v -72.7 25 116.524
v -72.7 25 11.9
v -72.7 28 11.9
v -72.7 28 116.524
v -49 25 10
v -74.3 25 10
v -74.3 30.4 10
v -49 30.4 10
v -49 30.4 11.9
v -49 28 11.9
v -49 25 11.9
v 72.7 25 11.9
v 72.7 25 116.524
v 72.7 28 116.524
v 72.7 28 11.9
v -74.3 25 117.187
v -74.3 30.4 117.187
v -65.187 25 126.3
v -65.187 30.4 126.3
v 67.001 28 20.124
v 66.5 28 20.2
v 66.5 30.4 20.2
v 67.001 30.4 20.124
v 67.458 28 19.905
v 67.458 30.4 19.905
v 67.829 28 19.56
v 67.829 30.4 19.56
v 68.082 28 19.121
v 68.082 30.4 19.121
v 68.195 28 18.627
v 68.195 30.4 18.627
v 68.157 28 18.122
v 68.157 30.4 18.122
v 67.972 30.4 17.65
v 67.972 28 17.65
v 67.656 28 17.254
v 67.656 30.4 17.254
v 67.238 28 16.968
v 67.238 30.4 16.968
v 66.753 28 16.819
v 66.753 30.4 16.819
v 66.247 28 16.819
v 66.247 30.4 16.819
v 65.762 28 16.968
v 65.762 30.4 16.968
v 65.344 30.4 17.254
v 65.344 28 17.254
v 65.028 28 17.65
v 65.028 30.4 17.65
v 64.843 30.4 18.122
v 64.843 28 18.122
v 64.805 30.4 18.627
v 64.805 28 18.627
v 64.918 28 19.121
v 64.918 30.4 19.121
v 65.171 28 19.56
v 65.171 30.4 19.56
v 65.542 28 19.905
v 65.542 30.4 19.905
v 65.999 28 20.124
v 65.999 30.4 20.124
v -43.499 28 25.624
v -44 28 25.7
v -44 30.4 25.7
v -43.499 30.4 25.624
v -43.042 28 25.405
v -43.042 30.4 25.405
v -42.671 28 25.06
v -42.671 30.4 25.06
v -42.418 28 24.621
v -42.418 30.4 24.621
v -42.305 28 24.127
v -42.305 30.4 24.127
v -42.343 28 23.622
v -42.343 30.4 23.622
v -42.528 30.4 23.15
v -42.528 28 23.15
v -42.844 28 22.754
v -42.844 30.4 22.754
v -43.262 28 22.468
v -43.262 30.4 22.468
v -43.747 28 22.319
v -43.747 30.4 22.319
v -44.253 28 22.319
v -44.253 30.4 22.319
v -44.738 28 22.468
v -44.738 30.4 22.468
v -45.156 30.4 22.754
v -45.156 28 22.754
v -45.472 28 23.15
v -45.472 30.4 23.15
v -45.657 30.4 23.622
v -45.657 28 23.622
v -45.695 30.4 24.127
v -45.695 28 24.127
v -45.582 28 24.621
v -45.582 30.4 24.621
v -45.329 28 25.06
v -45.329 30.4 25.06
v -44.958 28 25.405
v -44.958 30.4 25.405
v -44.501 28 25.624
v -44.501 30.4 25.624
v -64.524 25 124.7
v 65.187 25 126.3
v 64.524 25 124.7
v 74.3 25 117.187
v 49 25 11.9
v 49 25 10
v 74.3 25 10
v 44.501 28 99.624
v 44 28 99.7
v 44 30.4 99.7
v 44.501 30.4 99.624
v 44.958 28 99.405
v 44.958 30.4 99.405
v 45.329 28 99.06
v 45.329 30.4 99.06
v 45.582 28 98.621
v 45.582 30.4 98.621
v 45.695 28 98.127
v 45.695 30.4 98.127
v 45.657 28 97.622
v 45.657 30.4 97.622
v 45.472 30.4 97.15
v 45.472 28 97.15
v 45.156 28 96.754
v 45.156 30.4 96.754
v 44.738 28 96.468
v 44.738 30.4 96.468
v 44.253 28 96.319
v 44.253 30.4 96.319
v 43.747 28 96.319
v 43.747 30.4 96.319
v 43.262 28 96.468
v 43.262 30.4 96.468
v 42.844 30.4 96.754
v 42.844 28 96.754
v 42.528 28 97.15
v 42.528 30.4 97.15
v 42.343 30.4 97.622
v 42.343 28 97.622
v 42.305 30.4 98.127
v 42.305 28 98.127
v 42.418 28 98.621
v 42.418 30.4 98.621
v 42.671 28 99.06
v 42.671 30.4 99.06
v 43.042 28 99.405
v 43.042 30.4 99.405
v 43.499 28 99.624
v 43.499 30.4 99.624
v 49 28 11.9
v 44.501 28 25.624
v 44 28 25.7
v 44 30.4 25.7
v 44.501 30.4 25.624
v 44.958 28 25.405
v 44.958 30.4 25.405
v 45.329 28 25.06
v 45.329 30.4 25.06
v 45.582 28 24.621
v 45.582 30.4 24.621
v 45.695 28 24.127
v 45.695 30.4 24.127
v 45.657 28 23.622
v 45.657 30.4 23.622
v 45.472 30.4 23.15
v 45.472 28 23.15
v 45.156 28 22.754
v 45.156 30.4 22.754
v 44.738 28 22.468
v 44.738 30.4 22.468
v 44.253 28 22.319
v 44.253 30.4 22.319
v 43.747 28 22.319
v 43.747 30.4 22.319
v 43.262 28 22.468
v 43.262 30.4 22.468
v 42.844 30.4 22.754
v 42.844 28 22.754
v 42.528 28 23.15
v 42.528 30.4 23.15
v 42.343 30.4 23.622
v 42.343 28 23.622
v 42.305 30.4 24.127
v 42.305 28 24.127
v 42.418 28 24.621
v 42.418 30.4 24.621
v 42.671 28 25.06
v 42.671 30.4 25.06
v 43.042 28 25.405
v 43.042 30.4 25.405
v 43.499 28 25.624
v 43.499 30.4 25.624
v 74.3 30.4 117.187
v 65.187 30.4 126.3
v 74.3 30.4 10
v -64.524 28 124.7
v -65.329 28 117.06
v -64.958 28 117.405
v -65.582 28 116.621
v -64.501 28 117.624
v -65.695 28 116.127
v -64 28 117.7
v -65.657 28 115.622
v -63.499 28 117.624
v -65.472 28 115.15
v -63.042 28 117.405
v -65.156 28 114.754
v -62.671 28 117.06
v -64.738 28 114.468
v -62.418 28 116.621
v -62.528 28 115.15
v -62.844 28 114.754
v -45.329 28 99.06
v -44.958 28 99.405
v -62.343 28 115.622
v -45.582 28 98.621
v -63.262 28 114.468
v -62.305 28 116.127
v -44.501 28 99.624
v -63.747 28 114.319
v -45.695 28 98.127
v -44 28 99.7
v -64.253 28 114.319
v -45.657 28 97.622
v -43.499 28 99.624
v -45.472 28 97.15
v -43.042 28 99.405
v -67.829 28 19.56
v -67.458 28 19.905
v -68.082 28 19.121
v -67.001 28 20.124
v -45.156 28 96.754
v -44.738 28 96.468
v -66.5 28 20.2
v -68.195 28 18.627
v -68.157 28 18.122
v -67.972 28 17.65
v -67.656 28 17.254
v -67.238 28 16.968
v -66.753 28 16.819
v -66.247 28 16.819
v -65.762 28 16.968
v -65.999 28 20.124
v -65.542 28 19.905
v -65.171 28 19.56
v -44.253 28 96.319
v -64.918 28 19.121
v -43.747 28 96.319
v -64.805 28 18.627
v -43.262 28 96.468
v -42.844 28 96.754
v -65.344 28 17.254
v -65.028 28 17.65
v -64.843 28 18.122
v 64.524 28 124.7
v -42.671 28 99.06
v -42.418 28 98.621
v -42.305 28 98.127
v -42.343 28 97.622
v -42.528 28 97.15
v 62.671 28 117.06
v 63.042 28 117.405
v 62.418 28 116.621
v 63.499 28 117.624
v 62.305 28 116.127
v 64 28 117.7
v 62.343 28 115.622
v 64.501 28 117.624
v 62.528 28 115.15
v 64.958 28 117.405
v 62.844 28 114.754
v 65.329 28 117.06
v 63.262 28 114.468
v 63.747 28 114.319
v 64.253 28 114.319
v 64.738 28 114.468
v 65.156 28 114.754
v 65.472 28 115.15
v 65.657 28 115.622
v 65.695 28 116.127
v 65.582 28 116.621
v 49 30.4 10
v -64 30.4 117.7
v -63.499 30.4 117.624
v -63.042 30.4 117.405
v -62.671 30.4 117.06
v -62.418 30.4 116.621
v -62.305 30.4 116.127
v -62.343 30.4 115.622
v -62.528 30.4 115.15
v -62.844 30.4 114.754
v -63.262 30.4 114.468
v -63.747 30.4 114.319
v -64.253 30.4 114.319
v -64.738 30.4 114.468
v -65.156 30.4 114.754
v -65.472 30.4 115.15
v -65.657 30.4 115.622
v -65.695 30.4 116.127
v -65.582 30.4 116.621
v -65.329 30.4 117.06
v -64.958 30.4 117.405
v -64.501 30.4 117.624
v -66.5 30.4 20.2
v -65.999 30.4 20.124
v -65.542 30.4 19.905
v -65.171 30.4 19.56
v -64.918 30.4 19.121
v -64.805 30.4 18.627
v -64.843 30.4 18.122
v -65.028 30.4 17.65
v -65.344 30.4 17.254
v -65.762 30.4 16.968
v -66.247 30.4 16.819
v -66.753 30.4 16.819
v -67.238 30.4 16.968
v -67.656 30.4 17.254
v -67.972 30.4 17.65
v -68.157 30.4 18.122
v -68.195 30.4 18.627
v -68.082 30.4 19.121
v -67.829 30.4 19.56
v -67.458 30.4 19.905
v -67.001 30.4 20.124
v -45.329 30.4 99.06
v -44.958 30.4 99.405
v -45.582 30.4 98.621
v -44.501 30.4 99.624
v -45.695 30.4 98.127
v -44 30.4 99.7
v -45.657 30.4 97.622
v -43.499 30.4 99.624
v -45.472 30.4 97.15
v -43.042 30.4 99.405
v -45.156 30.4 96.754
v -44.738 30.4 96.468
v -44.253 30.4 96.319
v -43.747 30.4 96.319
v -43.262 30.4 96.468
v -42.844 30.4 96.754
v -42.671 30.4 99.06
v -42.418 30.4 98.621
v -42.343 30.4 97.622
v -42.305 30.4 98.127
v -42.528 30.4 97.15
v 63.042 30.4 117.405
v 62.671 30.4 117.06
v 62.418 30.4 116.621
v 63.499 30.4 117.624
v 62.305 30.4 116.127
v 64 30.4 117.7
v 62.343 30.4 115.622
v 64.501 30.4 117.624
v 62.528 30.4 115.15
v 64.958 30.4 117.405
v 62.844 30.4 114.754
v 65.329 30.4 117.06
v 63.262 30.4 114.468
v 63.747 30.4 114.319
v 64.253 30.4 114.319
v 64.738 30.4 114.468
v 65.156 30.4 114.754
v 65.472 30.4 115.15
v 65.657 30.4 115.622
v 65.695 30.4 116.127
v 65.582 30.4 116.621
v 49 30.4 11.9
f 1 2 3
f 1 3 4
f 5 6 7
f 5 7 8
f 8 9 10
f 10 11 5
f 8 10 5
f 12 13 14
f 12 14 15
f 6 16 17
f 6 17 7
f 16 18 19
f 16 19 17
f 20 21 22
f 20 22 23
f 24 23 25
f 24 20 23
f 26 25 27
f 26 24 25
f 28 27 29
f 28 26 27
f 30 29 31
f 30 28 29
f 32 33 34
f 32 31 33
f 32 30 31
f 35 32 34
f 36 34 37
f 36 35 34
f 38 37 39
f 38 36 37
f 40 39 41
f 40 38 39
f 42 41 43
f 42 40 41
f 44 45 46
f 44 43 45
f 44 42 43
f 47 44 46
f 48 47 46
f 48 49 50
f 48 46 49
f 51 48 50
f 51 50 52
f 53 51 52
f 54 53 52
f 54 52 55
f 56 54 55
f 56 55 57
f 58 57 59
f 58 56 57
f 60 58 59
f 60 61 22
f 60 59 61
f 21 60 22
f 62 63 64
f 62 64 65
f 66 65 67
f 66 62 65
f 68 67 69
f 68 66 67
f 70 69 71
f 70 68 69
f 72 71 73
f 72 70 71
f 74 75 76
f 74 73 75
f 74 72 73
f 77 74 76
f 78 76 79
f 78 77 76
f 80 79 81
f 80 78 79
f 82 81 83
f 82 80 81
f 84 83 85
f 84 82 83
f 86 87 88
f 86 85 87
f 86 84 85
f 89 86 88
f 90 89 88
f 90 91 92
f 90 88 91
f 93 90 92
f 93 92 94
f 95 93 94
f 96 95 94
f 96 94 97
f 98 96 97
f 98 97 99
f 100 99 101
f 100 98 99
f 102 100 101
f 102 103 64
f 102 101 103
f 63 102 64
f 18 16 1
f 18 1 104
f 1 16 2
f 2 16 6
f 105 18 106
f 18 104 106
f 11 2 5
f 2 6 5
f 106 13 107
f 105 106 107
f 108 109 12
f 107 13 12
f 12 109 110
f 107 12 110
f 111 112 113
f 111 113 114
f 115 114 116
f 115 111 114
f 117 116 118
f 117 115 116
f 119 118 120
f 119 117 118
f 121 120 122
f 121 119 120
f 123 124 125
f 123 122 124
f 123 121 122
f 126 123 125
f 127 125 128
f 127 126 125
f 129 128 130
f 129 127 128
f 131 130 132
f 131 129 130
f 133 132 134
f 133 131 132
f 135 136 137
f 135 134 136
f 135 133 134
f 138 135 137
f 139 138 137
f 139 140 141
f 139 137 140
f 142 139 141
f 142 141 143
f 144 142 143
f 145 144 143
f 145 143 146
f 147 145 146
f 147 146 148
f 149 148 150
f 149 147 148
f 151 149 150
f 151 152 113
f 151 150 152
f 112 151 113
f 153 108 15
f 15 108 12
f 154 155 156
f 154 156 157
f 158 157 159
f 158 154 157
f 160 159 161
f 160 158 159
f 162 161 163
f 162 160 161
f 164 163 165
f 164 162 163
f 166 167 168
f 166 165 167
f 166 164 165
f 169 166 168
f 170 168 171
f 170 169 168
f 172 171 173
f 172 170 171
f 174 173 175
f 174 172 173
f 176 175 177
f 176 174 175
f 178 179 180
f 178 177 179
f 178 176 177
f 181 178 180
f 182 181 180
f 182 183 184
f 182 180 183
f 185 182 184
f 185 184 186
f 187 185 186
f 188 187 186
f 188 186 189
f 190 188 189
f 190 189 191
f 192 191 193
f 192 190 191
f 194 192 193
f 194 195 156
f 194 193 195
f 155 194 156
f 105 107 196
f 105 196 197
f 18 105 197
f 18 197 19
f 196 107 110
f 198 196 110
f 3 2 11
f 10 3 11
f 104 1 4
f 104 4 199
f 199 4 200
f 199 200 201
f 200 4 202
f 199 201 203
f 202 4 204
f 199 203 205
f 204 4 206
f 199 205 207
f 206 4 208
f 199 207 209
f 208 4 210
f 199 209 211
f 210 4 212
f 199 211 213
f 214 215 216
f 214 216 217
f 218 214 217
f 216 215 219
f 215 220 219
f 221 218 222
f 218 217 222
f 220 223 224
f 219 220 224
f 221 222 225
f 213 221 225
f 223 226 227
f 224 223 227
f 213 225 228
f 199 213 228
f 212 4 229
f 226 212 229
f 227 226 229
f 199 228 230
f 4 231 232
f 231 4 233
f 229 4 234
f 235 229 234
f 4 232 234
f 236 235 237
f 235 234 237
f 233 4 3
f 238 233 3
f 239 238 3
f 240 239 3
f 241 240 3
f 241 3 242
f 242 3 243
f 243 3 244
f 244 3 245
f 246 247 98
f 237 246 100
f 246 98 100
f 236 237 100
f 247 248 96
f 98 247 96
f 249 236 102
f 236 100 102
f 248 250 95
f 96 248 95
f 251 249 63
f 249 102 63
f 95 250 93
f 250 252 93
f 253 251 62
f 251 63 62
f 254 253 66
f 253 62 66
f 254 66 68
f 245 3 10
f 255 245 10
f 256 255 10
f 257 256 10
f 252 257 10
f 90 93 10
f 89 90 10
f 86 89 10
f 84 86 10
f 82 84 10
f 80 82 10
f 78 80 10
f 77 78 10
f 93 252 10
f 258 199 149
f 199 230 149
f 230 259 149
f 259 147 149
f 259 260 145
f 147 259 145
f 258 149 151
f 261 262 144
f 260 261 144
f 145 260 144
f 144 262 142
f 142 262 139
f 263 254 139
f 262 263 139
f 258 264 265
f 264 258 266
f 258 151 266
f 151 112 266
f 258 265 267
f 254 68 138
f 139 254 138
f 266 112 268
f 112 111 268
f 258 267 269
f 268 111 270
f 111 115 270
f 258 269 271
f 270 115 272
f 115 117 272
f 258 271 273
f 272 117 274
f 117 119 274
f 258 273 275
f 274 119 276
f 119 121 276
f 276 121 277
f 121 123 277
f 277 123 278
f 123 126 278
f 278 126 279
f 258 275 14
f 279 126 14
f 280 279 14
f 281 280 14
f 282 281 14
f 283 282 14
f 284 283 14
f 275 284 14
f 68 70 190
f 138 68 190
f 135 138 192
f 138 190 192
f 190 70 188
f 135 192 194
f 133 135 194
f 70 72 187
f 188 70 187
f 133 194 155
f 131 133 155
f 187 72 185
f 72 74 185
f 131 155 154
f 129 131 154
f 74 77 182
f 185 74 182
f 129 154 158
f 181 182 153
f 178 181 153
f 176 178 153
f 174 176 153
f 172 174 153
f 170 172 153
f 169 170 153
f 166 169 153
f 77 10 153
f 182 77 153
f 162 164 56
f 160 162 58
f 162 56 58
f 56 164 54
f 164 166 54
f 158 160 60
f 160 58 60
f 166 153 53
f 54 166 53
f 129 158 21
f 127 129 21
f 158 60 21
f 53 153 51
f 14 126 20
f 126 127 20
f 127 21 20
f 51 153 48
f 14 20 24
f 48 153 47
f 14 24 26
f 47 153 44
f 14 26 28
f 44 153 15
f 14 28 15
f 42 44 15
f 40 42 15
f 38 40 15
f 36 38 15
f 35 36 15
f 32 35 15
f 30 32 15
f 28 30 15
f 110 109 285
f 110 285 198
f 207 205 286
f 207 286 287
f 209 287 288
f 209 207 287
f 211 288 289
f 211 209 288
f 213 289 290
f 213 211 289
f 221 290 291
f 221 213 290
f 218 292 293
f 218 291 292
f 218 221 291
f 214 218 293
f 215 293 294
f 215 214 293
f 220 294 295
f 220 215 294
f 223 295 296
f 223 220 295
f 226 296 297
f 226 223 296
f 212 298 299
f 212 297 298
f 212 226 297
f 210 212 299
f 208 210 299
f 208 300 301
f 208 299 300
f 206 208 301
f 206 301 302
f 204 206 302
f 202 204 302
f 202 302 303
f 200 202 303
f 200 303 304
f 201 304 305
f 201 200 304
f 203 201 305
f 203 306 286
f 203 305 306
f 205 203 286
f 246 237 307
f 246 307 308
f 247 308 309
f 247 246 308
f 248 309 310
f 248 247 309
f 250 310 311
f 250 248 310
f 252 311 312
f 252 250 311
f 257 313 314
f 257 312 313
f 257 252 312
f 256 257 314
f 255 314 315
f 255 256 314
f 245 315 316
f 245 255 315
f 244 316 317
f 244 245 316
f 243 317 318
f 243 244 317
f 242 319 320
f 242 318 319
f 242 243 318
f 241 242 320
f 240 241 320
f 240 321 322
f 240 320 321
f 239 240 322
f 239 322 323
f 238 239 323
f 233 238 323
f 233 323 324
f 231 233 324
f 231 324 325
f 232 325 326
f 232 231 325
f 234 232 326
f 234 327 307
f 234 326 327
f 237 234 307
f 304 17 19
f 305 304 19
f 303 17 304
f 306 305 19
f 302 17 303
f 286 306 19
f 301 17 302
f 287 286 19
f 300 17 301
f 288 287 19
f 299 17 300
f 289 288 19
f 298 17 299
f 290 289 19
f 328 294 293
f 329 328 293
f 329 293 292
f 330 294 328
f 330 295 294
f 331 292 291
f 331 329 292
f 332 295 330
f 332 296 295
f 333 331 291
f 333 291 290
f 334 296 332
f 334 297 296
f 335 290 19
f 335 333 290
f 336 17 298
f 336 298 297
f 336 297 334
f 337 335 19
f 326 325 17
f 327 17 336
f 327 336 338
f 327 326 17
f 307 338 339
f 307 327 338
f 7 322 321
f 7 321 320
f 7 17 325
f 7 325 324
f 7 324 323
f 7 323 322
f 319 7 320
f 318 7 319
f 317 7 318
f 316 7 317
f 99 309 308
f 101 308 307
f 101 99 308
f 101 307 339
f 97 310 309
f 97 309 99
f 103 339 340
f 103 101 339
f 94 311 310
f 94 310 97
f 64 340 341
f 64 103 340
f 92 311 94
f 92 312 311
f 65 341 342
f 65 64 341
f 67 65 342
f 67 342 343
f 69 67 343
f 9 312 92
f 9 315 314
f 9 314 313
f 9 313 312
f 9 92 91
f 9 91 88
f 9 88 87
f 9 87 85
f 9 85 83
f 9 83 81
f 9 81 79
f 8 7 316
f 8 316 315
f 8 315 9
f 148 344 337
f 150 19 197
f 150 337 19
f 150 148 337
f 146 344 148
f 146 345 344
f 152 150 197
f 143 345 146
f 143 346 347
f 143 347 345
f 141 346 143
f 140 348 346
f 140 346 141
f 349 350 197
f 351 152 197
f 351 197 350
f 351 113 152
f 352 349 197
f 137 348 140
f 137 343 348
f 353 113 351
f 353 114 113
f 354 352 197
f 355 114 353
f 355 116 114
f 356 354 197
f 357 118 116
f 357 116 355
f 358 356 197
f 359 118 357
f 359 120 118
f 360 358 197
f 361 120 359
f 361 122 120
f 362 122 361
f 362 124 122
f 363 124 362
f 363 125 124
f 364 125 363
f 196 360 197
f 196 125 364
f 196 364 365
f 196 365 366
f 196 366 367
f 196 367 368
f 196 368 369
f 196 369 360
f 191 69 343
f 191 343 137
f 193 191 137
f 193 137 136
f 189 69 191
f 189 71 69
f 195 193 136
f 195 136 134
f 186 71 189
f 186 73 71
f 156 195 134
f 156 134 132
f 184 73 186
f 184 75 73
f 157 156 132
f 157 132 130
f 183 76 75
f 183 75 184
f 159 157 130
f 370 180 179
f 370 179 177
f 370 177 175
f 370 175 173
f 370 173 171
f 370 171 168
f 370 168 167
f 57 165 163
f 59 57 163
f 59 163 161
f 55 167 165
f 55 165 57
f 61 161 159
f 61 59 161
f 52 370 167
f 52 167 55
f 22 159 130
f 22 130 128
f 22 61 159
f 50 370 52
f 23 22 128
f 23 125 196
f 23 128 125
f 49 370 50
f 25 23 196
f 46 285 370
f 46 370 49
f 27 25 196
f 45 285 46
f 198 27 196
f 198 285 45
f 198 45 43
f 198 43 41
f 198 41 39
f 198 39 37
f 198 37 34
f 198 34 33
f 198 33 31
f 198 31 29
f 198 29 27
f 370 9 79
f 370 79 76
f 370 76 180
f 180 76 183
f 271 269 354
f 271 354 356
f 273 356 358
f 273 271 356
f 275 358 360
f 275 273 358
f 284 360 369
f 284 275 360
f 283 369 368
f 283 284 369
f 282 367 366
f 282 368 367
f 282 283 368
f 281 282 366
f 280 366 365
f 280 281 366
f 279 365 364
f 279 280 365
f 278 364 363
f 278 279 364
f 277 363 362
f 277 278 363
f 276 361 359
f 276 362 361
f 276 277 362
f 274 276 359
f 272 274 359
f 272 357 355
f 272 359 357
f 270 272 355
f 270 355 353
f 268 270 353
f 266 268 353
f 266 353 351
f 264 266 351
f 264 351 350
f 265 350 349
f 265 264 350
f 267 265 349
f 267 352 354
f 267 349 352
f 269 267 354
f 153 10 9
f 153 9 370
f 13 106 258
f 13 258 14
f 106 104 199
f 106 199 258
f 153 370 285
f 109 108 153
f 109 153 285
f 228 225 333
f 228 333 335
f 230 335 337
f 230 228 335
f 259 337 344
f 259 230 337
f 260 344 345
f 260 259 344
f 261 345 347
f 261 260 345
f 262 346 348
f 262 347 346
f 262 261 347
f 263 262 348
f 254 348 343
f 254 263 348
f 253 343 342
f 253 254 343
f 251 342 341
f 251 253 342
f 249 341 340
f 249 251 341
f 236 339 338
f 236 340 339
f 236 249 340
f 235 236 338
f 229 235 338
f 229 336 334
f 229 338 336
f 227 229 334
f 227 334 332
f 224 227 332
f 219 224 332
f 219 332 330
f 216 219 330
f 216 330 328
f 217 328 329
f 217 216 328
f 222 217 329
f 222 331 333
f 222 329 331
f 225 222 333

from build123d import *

# Parameters (mm, degrees)
LID_PLATE_DEPTH     = 2.4
DRIP_SKIRT_DEPTH    = 3.01
SKETCH3_W           = 25.3
SKETCH3_H           = 1.9
FRONT_SKIRT_L_DEPTH = 5.4
SKETCH4_W           = 25.3
SKETCH4_H           = 1.9
FRONT_SKIRT_R_DEPTH = 5.4
SKETCH5_R           = 1.7
SCREW_HOLES_DEPTH   = 4.4


with BuildPart() as part:
    # Sketch1 → Lid Plate (new body)
    with BuildSketch(Plane(origin=(0, 28, 0), x_dir=(1, 0, 0), z_dir=(0, 1, 0))):
        Polygon((-65.187005769, -126.3), (65.187005769, -126.3), (74.3, -117.187005769), (74.3, -11.9), (-74.3, -11.9), (-74.3, -117.187005769), align=None)
    extrude(amount=LID_PLATE_DEPTH)

    # Sketch2 → Drip Skirt (add)
    with BuildSketch(Plane(origin=(0, 25, 0), x_dir=(1, 0, 0), z_dir=(0, 1, 0))):
        Polygon((74.3, -11.9), (74.3, -117.187005769), (65.187005769, -126.3), (-65.187005769, -126.3), (-74.3, -117.187005769), (-74.3, -11.9), (-72.7, -11.9), (-72.7, -116.524264069), (-64.524264069, -124.7), (64.524264069, -124.7), (72.7, -116.524264069), (72.7, -11.9), align=None)
    extrude(amount=DRIP_SKIRT_DEPTH)

    # Sketch3 → Front Skirt L (add)
    with BuildSketch(Plane(origin=(0, 25, 0), x_dir=(1, 0, 0), z_dir=(0, 1, 0))):
        with Locations((-61.65, -10.95)):
            Rectangle(SKETCH3_W, SKETCH3_H)
    extrude(amount=FRONT_SKIRT_L_DEPTH)

    # Sketch4 → Front Skirt R (add)
    with BuildSketch(Plane(origin=(0, 25, 0), x_dir=(1, 0, 0), z_dir=(0, 1, 0))):
        with Locations((61.65, -10.95)):
            Rectangle(SKETCH4_W, SKETCH4_H)
    extrude(amount=FRONT_SKIRT_R_DEPTH)

    # Sketch5 → Screw Holes (cut)
    with BuildSketch(Plane(origin=(0, 27, 0), x_dir=(1, 0, 0), z_dir=(0, 1, 0))):
        with Locations(Location((-66.5, -18.5, 0), (0, 0, 270))):
            Circle(SKETCH5_R)
        with Locations(Location((66.5, -18.5, 0), (0, 0, 270))):
            Circle(SKETCH5_R)
        with Locations(Location((-64, -116, 0), (0, 0, 270))):
            Circle(SKETCH5_R)
        with Locations(Location((64, -116, 0), (0, 0, 270))):
            Circle(SKETCH5_R)
        with Locations(Location((-44, -24, 0), (0, 0, 270))):
            Circle(SKETCH5_R)
        with Locations(Location((-44, -98, 0), (0, 0, 270))):
            Circle(SKETCH5_R)
        with Locations(Location((44, -24, 0), (0, 0, 270))):
            Circle(SKETCH5_R)
        with Locations(Location((44, -98, 0), (0, 0, 270))):
            Circle(SKETCH5_R)
    extrude(amount=SCREW_HOLES_DEPTH, mode=Mode.SUBTRACT)


solid = part.part
